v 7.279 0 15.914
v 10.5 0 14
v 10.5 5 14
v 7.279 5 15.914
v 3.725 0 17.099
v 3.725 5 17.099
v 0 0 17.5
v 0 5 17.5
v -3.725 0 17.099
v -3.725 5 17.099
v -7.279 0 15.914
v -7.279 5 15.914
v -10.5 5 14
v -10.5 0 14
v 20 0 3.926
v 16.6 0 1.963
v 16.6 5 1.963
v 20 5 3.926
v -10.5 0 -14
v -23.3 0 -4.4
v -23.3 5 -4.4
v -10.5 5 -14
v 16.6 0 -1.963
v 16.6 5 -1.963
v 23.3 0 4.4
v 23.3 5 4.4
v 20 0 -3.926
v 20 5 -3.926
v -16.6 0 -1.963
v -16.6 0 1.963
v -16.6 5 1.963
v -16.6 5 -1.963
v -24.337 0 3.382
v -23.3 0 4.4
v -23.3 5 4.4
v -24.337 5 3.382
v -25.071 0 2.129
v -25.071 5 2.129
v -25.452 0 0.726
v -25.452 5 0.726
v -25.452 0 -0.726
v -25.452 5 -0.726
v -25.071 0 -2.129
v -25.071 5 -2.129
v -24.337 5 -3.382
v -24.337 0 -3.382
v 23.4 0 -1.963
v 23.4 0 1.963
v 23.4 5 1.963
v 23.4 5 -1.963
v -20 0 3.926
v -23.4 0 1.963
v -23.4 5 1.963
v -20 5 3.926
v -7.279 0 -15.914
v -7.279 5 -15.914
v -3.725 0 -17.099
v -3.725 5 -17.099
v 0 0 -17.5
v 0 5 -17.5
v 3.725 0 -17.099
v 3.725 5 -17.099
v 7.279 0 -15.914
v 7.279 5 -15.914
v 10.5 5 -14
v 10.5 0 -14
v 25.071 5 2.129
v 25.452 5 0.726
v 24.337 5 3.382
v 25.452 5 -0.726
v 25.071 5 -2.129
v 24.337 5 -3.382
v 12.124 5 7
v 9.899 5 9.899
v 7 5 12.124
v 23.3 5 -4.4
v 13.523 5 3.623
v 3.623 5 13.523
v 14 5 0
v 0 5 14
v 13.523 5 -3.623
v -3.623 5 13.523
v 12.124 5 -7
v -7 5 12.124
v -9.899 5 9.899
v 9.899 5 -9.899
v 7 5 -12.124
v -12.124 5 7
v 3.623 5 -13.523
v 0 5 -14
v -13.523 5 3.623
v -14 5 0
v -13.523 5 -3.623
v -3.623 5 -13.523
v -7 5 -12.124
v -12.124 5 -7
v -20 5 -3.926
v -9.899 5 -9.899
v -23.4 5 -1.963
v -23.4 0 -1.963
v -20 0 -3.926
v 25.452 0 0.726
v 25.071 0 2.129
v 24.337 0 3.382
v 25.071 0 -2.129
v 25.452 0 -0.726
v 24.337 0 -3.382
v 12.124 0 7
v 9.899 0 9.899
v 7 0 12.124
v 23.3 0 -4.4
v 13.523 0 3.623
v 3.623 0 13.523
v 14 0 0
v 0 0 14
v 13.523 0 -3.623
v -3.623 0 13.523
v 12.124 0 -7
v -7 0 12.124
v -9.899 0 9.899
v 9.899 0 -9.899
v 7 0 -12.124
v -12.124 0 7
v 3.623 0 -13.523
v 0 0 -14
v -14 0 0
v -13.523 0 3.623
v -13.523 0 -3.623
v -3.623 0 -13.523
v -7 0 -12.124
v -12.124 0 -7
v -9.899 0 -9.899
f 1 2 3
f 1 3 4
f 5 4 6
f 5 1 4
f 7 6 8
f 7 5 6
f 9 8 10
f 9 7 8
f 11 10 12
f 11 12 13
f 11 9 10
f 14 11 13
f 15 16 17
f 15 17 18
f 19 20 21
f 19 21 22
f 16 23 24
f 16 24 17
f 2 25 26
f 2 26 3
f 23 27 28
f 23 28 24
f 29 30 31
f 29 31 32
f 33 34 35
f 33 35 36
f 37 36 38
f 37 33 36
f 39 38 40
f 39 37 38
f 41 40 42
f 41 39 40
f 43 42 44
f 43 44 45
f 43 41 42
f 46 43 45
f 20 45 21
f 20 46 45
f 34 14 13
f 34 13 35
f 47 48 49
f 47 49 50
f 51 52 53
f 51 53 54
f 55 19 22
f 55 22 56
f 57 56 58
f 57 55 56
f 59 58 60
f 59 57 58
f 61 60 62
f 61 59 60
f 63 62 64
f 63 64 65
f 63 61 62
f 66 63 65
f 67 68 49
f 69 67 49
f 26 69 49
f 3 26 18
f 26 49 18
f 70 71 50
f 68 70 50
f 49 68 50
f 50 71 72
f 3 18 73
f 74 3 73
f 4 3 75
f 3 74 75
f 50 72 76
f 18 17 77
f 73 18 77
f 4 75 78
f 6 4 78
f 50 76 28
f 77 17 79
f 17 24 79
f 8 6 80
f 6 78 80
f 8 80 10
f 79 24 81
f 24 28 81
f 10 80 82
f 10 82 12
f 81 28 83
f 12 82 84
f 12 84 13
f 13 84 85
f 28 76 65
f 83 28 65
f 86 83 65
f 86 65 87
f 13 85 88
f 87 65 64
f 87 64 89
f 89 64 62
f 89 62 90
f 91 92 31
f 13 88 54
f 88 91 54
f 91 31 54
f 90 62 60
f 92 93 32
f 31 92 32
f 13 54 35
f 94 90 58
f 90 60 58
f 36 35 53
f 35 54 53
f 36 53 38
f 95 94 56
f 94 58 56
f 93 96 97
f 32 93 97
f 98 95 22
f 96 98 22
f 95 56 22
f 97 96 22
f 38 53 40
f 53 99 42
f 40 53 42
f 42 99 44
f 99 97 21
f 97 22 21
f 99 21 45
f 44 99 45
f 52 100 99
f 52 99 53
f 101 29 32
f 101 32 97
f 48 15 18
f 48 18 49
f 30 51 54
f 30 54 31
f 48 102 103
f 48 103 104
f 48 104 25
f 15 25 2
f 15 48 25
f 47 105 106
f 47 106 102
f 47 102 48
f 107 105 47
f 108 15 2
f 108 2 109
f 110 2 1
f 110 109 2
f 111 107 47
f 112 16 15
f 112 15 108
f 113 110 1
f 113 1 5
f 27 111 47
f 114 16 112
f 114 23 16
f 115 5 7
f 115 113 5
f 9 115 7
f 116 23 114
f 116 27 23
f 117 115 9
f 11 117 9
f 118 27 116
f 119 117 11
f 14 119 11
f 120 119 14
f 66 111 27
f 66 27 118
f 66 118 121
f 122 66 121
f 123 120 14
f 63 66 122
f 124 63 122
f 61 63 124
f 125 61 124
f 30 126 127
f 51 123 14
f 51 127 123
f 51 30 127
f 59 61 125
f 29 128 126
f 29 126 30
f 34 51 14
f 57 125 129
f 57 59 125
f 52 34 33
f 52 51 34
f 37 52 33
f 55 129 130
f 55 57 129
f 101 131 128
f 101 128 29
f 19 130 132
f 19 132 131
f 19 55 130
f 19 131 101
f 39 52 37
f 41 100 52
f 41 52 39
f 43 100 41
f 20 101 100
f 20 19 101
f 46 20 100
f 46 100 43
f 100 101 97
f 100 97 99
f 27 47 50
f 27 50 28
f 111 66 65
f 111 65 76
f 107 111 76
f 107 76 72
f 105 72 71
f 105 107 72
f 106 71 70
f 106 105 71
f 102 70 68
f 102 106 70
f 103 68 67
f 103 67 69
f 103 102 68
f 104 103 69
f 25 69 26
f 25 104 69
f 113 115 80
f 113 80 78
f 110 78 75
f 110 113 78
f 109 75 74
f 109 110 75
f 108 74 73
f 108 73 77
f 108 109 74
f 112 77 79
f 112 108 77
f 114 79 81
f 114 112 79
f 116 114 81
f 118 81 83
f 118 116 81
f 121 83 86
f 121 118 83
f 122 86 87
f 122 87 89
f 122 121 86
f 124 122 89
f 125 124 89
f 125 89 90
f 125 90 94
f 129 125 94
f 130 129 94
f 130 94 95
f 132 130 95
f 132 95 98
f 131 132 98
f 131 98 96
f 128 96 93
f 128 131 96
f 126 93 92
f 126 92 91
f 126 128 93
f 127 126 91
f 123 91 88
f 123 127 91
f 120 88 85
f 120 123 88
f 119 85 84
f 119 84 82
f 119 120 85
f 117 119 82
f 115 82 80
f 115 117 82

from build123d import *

# Parameters (mm, degrees)
SKETCH1_R           = 14
BOSS_EXTRUDE1_DEPTH = 5


with BuildPart() as part:
    # Sketch1 → Boss-Extrude1 (new body)
    with BuildSketch(Plane(origin=(0, 0, 0), x_dir=(1, 0, 0), z_dir=(0, 1, 0))):
        with BuildLine():
            Line((-23.3, 4.4), (-10.5, 14))
            ThreePointArc((-10.5, 14), (0, 17.5), (10.5, 14))
            Line((10.5, 14), (23.3, 4.4))
            ThreePointArc((23.3, 4.4), (25.5, 0), (23.3, -4.4))
            Line((23.3, -4.4), (10.5, -14))
            ThreePointArc((10.5, -14), (0, -17.5), (-10.5, -14))
            Line((-10.5, -14), (-23.3, -4.4))
            ThreePointArc((-23.3, -4.4), (-25.5, 0), (-23.3, 4.4))
        make_face()
        with Locations(Location((0, 0, 0), (0, 0, 270))):
            Circle(SKETCH1_R, mode=Mode.SUBTRACT)
        Polygon((-20, 3.92598183), (-23.4, 1.962990915), (-23.4, -1.962990915), (-20, -3.92598183), (-16.6, -1.962990915), (-16.6, 1.962990915), align=None, mode=Mode.SUBTRACT)
        Polygon((20, -3.92598183), (23.4, -1.962990915), (23.4, 1.962990915), (20, 3.92598183), (16.6, 1.962990915), (16.6, -1.962990915), align=None, mode=Mode.SUBTRACT)
    extrude(amount=BOSS_EXTRUDE1_DEPTH)


solid = part.part
